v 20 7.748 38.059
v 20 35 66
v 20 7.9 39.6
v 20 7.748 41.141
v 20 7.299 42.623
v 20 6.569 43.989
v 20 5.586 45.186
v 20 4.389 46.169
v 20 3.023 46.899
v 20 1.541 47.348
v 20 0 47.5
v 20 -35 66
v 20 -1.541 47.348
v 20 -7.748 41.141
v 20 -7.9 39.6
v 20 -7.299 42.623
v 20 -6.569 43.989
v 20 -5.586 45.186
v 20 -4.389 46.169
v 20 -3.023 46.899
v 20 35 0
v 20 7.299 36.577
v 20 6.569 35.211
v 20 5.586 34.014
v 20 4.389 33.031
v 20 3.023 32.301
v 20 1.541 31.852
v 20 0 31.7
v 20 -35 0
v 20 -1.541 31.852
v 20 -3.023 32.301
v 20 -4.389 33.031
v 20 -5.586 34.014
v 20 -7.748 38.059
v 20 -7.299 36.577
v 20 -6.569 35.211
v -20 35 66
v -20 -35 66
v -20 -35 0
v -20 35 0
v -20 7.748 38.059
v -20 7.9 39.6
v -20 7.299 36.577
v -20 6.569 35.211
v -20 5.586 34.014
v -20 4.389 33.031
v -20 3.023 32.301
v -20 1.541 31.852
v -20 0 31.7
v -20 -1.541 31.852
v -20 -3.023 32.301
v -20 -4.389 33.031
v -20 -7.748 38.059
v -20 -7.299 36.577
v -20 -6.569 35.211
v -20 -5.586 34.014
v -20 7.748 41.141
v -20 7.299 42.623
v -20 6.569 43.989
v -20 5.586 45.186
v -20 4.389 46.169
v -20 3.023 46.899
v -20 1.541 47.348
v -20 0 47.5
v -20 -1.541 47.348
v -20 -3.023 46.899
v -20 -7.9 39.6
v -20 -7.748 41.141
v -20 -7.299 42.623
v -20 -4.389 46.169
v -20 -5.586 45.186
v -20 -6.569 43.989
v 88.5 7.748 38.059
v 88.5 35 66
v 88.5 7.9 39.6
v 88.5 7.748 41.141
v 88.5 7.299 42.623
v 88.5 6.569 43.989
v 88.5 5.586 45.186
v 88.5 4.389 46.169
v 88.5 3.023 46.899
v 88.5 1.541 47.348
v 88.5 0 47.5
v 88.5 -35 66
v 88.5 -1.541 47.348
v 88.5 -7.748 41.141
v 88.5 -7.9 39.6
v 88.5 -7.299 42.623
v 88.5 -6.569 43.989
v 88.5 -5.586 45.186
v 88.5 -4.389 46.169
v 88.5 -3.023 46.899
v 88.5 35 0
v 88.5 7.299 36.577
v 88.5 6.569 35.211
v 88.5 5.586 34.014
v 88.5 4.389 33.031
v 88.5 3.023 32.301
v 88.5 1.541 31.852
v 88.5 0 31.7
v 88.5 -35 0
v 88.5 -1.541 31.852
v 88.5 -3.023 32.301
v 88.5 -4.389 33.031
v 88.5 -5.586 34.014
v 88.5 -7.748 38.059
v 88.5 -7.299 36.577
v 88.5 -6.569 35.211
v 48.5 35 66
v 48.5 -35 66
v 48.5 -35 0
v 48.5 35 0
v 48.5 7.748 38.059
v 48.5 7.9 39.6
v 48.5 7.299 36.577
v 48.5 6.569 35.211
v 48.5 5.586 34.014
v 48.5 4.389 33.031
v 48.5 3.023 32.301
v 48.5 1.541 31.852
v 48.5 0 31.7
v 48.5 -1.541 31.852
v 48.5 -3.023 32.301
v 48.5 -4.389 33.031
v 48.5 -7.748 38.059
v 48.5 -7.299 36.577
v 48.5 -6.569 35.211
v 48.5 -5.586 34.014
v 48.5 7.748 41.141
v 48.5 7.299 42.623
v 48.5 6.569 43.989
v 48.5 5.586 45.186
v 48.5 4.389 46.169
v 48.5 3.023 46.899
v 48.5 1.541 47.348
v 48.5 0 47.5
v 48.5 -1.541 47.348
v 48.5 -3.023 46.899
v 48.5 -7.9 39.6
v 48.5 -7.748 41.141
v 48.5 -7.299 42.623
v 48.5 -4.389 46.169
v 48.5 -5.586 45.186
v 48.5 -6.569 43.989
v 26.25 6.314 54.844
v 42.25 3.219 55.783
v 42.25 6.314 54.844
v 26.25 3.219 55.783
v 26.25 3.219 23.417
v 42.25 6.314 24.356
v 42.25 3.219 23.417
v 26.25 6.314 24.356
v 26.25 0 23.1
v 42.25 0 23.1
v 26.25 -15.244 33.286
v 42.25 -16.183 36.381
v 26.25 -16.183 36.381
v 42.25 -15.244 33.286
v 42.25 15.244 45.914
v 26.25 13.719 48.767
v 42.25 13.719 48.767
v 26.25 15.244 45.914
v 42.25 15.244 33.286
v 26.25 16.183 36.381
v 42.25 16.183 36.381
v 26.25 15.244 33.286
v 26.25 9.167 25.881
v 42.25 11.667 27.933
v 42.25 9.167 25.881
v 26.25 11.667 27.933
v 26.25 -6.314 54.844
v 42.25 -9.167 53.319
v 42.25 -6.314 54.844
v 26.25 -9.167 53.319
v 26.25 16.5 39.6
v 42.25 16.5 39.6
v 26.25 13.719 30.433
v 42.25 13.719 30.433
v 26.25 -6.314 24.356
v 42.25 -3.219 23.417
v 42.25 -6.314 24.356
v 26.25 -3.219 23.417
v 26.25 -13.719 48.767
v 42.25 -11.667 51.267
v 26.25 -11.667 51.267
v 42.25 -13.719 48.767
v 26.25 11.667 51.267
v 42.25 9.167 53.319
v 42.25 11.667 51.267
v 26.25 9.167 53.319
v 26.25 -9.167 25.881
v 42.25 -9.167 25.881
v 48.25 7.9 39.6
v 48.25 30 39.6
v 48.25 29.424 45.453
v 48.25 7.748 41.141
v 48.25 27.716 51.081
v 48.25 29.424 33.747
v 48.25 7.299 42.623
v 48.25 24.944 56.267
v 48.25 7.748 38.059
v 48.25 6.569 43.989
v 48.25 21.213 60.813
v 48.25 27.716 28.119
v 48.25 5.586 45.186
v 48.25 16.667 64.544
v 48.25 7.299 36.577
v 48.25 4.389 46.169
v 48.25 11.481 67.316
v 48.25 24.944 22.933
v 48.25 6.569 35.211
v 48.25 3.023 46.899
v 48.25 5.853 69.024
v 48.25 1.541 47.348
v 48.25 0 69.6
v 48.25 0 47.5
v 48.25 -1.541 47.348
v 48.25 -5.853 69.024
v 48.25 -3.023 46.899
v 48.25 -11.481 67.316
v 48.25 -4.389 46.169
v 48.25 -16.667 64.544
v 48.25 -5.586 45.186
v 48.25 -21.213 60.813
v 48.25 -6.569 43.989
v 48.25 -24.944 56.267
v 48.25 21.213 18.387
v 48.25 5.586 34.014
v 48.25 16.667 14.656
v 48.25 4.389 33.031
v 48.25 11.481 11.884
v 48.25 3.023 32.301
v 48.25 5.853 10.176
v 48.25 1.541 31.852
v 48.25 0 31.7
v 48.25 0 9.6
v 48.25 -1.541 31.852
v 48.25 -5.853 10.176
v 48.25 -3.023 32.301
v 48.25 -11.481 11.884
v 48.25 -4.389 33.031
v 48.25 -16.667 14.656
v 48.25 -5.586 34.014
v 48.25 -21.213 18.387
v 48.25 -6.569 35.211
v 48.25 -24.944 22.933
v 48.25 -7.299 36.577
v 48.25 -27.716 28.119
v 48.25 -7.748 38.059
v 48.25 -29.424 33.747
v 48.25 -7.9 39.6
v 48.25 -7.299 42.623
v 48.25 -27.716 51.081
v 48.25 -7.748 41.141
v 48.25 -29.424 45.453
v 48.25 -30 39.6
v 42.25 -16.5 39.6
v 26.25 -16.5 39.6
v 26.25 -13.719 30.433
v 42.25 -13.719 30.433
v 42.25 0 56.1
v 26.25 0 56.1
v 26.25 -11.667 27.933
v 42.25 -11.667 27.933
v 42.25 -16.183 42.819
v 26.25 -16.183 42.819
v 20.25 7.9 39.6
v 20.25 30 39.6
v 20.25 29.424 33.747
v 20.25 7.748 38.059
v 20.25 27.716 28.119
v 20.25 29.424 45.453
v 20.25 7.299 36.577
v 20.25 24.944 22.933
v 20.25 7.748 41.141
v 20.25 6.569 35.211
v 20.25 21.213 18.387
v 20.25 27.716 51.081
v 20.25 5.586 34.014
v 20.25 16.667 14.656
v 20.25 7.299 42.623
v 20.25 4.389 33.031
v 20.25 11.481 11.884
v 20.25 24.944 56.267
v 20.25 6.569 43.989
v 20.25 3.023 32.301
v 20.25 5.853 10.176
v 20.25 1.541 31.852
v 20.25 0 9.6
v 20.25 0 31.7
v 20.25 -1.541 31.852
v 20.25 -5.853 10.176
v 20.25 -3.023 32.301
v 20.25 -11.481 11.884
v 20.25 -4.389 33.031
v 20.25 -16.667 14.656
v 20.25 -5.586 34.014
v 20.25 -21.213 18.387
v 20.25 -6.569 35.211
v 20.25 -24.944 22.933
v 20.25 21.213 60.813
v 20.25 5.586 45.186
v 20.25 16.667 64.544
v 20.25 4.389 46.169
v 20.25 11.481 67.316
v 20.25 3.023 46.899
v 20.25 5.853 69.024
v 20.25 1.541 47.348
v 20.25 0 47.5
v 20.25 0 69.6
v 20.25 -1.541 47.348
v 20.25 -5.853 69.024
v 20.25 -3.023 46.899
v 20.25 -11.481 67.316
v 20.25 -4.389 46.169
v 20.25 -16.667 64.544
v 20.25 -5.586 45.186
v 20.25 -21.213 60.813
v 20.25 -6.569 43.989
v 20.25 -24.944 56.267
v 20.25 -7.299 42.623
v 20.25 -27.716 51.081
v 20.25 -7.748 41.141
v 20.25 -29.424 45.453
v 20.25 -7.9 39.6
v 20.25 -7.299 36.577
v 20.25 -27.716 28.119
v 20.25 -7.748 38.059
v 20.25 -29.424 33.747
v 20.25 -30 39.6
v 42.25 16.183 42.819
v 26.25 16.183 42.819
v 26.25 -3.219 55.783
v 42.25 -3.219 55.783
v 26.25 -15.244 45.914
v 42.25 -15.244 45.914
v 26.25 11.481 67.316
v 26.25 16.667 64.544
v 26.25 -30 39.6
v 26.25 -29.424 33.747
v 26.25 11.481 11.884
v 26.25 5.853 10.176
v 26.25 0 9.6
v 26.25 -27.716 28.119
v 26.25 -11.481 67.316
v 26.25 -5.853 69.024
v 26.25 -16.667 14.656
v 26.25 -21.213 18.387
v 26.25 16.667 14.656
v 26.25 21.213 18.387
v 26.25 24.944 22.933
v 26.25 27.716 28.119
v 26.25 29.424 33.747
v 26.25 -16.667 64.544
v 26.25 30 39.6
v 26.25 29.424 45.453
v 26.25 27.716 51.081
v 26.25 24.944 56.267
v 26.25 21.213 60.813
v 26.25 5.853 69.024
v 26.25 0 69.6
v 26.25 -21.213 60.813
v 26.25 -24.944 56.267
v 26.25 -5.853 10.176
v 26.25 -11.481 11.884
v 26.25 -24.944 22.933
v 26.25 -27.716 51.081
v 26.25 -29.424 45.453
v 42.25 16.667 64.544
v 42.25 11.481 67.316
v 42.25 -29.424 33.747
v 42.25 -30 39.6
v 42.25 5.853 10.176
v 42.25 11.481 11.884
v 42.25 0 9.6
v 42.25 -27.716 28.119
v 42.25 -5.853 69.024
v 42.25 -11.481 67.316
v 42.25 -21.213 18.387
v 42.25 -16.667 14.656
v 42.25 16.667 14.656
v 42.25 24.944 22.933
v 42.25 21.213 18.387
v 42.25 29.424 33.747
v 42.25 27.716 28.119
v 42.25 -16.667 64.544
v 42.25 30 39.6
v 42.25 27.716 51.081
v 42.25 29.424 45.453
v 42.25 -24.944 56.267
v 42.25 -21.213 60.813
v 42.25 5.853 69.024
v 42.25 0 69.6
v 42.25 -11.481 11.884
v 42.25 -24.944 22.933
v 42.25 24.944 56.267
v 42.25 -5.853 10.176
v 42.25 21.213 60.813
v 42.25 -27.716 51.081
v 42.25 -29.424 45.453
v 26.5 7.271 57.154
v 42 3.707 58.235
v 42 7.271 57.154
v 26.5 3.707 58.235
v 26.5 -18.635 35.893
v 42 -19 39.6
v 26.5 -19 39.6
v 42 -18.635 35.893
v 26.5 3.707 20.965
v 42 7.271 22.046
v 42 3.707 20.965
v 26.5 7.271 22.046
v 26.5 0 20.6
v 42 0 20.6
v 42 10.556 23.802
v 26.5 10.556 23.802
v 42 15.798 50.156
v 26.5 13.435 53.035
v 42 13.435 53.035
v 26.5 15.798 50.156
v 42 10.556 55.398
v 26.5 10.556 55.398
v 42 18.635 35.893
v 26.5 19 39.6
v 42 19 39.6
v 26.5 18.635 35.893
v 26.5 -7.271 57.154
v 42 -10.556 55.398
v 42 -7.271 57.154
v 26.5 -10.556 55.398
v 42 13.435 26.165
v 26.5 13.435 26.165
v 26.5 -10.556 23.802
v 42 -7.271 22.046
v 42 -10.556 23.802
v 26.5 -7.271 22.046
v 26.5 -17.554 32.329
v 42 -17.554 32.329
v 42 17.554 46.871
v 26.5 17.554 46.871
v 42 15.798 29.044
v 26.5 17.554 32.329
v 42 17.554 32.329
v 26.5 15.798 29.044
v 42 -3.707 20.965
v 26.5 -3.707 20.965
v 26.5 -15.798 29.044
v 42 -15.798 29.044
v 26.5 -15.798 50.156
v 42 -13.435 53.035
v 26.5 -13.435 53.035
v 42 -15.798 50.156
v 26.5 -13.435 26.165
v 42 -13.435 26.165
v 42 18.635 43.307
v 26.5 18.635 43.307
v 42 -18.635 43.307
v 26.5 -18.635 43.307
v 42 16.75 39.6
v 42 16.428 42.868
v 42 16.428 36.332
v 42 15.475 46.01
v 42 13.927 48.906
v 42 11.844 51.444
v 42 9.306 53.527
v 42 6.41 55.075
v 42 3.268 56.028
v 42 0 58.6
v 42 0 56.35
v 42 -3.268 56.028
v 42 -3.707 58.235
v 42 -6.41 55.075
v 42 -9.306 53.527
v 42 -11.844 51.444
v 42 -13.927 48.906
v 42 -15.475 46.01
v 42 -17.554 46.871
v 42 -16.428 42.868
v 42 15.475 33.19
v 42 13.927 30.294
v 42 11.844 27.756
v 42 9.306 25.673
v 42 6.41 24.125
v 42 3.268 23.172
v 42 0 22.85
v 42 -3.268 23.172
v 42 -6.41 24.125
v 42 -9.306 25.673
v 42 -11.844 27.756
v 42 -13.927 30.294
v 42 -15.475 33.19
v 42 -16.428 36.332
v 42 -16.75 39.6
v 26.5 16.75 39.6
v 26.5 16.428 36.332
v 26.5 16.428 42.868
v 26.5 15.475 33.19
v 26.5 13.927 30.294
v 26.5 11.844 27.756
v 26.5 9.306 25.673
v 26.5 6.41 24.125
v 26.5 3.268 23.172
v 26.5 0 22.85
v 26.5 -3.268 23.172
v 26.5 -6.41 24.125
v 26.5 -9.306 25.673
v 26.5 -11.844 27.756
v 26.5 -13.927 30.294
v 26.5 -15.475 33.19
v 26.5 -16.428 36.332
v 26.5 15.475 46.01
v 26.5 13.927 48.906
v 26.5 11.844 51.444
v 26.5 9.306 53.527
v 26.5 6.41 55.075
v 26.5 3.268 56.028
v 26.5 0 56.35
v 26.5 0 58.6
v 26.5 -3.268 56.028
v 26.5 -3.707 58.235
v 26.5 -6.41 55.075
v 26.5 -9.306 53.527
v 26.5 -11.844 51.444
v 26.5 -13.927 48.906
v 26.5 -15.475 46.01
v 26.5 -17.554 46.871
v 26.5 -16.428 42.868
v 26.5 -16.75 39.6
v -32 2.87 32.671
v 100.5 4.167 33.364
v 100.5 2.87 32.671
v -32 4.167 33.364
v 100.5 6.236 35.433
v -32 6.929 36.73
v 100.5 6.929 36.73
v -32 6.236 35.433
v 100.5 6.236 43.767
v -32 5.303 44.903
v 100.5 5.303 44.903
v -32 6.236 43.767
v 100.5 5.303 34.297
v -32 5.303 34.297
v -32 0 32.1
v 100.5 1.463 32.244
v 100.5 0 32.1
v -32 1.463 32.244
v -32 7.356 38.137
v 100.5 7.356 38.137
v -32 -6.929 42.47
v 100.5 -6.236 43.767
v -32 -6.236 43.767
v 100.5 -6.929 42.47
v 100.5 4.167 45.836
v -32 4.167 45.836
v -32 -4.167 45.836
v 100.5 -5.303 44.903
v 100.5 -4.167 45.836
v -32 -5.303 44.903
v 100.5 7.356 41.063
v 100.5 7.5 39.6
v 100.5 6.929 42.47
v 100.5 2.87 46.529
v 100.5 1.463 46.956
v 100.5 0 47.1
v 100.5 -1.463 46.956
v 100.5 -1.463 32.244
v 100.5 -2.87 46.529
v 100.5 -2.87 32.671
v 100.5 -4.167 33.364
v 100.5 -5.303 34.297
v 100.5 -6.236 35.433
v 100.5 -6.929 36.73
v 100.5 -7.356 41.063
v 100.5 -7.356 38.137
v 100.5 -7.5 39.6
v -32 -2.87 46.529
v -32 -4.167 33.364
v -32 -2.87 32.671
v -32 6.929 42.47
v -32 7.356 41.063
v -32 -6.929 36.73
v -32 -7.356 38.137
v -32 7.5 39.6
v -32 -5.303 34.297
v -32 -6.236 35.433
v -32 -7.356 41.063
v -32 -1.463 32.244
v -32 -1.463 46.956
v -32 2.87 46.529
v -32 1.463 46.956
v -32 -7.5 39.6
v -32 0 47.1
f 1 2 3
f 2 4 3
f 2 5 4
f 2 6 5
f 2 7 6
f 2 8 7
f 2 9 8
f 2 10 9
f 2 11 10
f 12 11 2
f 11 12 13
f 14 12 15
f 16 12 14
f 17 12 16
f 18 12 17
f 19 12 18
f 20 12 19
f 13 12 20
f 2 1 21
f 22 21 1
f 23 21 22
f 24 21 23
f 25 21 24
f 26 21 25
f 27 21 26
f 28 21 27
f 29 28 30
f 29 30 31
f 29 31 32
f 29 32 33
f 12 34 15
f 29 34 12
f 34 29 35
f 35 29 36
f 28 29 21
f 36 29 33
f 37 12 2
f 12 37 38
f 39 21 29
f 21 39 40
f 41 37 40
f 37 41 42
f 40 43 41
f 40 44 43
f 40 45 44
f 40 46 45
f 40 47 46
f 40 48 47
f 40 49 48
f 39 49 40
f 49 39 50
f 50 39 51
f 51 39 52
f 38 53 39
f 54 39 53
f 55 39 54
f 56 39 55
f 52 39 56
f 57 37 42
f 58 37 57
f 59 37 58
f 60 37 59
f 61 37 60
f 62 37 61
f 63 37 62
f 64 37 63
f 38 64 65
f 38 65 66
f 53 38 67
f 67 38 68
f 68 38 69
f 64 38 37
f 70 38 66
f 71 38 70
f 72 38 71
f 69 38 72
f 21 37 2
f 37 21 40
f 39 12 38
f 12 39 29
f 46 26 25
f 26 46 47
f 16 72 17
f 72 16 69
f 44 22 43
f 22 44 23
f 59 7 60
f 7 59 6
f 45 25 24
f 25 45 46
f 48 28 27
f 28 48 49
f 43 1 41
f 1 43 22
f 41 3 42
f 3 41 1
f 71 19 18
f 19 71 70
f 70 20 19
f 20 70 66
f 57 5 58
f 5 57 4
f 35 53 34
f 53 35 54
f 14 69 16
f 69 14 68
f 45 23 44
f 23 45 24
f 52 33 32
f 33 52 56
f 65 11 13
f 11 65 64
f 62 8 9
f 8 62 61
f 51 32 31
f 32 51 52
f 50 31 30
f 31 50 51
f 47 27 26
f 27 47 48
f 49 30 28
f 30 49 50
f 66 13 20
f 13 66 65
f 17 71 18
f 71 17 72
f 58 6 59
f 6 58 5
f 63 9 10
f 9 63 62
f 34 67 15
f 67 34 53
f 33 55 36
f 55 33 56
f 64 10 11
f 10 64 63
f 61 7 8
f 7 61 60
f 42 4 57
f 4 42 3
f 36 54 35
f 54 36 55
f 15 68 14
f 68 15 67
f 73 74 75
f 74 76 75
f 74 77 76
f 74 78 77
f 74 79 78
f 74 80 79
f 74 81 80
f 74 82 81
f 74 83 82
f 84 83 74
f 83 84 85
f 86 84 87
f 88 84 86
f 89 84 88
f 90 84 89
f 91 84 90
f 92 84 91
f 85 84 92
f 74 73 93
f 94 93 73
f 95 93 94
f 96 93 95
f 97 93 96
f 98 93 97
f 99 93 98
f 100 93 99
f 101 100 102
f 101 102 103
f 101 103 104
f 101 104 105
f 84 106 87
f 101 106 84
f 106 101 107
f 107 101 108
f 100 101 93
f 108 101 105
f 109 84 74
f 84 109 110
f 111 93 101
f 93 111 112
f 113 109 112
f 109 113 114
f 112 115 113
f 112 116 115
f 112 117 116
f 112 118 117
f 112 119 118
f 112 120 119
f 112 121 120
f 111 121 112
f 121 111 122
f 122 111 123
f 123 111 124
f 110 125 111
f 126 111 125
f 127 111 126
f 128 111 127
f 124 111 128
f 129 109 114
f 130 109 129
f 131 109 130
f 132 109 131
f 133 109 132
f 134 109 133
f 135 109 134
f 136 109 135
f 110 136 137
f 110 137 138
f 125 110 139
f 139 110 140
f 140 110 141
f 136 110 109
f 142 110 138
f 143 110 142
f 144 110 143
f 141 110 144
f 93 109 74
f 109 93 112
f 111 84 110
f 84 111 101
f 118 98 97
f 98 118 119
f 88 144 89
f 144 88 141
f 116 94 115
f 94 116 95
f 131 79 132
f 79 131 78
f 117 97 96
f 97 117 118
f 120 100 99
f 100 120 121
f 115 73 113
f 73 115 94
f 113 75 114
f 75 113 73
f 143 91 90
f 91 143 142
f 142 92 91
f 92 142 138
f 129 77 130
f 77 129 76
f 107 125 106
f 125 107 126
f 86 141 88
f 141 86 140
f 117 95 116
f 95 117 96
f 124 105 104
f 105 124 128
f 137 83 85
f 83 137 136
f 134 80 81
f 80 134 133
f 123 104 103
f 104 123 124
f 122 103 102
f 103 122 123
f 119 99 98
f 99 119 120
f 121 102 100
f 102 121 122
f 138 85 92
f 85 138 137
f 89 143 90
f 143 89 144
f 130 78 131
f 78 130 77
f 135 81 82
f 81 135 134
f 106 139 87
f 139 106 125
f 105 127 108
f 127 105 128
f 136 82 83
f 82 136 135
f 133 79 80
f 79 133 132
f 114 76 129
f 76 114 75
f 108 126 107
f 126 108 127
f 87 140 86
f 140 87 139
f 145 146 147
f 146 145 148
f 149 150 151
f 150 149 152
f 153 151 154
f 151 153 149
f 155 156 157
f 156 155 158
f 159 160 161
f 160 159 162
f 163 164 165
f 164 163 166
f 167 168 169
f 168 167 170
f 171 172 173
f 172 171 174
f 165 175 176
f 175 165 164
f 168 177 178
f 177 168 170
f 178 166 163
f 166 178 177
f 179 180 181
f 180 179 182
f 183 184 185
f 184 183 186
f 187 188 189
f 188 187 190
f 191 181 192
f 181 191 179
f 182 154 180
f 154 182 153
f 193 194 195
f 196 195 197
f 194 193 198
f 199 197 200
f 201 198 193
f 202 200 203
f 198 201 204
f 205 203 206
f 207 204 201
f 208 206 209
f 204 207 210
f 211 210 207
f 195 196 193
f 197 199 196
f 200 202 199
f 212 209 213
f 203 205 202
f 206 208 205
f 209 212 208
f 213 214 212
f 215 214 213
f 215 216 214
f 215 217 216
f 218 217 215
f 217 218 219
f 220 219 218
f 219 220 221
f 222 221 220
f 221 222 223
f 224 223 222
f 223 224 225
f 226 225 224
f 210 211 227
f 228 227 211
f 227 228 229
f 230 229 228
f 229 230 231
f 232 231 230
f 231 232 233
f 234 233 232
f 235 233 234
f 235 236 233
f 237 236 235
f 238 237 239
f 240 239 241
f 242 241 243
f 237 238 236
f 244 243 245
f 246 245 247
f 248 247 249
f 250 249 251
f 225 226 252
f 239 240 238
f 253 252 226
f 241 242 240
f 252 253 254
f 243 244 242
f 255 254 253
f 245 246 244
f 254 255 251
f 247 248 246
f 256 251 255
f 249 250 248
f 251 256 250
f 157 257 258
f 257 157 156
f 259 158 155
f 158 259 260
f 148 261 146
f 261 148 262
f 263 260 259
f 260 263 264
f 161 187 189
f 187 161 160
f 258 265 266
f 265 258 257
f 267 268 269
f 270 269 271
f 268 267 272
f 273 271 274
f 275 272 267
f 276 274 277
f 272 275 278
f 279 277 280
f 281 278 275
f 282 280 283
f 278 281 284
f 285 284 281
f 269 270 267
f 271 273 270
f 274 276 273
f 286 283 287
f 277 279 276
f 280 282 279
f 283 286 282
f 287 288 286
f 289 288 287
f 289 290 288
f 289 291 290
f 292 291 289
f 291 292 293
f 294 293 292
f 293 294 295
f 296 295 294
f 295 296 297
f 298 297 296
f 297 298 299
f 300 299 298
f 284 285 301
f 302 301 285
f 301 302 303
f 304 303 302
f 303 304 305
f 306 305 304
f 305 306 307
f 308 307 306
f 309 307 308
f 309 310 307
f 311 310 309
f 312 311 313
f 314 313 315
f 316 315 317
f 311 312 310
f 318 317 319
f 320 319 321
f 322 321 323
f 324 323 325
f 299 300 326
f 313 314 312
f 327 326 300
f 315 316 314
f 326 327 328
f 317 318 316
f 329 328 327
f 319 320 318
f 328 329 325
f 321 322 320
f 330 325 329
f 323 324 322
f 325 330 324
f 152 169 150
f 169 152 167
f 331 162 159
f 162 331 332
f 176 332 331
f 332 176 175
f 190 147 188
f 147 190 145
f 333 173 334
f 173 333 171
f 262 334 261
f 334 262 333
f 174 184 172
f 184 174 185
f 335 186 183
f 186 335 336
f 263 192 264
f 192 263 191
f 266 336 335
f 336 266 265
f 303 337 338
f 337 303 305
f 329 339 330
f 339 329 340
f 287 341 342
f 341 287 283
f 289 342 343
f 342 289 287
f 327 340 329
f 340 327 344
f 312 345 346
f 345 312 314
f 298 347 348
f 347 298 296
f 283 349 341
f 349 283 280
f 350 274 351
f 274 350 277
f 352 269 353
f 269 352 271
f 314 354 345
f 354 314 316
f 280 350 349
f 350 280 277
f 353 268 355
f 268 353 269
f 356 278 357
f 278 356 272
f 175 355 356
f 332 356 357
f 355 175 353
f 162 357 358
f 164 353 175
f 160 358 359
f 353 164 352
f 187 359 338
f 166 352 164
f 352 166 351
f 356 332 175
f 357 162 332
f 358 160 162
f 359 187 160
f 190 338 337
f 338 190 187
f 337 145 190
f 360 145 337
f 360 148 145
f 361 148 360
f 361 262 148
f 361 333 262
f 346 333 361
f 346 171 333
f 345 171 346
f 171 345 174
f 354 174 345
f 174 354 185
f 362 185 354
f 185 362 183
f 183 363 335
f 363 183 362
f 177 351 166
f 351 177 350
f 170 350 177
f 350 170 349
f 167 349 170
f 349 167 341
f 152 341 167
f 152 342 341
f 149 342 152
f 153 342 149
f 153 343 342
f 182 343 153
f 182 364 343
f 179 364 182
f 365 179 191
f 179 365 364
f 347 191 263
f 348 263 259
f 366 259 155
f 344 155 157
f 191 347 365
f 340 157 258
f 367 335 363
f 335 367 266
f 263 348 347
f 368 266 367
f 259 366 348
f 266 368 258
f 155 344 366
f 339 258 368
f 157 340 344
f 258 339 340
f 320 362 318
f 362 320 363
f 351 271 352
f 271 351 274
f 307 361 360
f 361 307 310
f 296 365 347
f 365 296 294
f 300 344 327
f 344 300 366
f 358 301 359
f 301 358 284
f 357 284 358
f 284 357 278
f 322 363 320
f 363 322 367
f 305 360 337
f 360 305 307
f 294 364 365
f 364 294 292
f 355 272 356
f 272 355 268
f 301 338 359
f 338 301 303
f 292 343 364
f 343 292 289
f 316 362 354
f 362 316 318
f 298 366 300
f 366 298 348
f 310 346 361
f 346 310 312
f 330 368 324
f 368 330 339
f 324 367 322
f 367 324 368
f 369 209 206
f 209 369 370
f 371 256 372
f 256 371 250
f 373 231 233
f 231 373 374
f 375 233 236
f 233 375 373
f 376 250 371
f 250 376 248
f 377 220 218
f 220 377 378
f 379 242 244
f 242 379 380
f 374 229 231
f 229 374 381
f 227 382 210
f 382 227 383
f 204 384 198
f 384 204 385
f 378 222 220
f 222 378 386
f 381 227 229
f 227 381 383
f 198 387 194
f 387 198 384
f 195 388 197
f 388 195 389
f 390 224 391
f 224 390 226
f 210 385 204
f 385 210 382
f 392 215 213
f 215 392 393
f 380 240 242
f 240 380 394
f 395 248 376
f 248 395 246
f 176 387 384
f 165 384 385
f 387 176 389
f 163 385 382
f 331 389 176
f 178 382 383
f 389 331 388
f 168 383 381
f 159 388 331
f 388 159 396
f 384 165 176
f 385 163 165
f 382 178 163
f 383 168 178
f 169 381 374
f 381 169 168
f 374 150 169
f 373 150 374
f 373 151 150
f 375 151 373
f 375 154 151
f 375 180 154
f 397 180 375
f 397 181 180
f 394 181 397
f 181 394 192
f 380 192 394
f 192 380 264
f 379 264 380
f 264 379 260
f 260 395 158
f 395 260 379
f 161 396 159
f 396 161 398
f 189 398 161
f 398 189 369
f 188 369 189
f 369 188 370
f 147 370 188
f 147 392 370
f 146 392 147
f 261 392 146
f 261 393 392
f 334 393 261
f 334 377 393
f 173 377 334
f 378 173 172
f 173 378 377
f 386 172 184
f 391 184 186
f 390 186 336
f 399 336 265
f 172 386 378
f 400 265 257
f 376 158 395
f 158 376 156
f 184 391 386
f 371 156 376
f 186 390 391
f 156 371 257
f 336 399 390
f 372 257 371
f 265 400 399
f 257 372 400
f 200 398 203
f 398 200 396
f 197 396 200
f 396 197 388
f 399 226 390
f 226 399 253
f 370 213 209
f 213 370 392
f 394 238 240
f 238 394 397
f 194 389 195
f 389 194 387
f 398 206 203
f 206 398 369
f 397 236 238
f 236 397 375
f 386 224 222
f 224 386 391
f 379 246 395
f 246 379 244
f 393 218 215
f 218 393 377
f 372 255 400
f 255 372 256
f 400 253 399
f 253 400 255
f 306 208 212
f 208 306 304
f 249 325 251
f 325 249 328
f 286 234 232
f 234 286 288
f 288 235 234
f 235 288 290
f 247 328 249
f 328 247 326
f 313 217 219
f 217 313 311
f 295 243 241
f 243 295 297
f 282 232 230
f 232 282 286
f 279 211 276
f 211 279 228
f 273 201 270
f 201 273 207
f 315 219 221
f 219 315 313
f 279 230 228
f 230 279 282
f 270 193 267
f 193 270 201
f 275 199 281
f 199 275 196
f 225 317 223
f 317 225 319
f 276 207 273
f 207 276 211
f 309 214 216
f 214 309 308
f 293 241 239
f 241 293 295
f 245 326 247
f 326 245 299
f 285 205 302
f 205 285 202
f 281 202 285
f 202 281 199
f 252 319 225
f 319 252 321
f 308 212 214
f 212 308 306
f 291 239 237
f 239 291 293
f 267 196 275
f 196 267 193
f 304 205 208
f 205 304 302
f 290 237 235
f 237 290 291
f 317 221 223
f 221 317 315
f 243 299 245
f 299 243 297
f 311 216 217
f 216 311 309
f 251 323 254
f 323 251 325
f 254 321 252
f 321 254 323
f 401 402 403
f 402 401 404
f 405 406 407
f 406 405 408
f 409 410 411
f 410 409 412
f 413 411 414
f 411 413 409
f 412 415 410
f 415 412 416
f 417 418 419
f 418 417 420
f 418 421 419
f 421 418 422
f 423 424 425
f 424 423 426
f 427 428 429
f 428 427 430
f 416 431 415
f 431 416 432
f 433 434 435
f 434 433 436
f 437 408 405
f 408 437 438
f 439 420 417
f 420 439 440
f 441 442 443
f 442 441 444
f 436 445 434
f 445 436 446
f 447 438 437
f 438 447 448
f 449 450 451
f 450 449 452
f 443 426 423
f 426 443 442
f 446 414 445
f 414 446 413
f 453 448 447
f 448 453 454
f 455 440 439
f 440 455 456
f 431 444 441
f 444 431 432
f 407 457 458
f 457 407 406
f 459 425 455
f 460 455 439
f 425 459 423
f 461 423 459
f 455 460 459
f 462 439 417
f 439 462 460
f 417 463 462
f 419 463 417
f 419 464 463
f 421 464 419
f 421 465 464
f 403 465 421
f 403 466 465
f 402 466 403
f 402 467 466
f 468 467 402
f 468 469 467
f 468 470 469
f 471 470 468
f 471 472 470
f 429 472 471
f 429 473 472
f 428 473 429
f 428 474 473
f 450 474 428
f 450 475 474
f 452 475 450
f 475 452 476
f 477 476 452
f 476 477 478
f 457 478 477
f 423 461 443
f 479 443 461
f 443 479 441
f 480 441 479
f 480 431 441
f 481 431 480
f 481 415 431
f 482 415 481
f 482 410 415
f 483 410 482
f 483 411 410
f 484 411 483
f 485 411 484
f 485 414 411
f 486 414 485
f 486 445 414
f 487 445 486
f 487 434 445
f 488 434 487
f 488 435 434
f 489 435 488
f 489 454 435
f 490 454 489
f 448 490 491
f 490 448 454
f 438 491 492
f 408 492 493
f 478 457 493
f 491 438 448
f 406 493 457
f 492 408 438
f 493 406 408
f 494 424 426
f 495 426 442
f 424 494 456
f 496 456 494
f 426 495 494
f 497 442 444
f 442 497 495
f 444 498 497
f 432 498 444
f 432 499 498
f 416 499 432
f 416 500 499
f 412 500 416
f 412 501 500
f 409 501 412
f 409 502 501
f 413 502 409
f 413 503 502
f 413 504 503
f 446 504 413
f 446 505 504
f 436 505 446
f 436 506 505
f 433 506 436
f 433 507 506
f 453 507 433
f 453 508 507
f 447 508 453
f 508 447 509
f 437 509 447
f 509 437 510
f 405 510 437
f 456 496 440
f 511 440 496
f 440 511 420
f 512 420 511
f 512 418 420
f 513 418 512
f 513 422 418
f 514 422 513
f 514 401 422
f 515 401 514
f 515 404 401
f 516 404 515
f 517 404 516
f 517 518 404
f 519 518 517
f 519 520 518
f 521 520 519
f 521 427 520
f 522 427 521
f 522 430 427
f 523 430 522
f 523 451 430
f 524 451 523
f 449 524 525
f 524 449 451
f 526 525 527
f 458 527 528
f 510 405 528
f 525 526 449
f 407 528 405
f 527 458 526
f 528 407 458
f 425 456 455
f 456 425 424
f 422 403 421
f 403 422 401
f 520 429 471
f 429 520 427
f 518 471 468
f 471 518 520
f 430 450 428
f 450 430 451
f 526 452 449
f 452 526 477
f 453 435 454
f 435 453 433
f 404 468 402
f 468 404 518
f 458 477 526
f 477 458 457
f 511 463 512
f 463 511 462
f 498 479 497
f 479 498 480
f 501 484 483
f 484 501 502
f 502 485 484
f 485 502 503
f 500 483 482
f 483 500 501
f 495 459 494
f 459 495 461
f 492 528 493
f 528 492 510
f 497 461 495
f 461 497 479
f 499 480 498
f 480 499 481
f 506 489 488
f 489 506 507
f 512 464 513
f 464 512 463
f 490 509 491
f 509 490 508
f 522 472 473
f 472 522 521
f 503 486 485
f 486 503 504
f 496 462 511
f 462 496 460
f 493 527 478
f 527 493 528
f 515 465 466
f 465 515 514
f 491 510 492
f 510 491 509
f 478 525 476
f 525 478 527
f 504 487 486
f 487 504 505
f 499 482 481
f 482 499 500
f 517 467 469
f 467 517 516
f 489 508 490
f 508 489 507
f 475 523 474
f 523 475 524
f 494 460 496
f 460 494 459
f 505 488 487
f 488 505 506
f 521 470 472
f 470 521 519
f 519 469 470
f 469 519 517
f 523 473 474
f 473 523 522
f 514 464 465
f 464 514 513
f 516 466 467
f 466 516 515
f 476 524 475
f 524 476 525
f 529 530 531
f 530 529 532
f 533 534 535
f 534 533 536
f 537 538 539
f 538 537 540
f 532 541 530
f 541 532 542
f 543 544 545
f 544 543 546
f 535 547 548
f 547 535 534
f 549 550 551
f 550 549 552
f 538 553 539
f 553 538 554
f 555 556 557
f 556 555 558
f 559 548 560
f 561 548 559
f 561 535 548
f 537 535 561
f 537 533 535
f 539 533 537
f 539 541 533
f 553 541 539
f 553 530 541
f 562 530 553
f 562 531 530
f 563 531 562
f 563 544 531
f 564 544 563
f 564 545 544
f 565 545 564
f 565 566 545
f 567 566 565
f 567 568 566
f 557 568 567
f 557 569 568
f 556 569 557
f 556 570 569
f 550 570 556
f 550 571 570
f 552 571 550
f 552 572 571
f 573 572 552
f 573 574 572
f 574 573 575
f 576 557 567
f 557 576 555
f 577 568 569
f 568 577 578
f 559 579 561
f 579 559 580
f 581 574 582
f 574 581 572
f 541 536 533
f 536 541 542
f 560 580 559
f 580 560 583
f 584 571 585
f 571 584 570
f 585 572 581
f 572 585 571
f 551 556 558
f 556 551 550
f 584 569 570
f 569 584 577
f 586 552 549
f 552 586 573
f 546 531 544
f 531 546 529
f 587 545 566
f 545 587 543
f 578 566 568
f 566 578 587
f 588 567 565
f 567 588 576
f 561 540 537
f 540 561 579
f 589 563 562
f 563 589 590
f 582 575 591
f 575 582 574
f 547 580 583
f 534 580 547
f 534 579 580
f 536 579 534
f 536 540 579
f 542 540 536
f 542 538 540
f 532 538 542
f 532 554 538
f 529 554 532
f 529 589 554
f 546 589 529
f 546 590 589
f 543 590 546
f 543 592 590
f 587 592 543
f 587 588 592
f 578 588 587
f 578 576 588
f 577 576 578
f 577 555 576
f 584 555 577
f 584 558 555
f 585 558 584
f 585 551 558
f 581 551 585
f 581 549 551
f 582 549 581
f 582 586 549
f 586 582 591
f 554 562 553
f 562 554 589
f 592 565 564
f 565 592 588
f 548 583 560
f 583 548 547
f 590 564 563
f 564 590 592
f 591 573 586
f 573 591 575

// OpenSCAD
$fn = 32;

// ------------------------------------------------------------------------
// Pulley assembly: d60 pulley with a belt, shaft d15
// Every part is its own module, assembly() places them once.
// ------------------------------------------------------------------------

// --- part 1 ---
module support1() {
  difference() {
    translate([-20, -35, 0]) cube([40, 70, 66]);
    translate([0, 0, 39.6]) rotate([0, 90, 0]) cylinder(h = 42, d = 15.8, center = true);
  }
}

// --- part 2 ---
module support2() {
  difference() {
    translate([-20, -35, 0]) cube([40, 70, 66]);
    translate([0, 0, 39.6]) rotate([0, 90, 0]) cylinder(h = 42, d = 15.8, center = true);
  }
}

// --- part 3 ---
module shaft() {
  translate([0, 0, -66.25]) cylinder(h = 132.5, d = 15);
}

// --- part 4 ---
module pulley() {
  difference() {
    union() {
      cylinder(h = 28, d = 33);
      cylinder(h = 6, d = 60);
      translate([0, 0, 22]) cylinder(h = 6, d = 60);
    }
    translate([0, 0, -1]) cylinder(h = 30, d = 15.8);
  }
}

// --- part 5 ---
module belt() {
  difference() {
      translate([0, 0, 0]) cylinder(h = 15.5, d = 38);
      translate([0, 0, -1]) cylinder(h = 17.5, d = 33.5);
    }
}

// --- assembly ---
module assembly() {
  translate([0, 0, 0]) rotate([0, 0, 0]) support1();
  translate([68.5, 0, 0]) rotate([0, 0, 0]) support2();
  translate([34.25, 0, 39.6]) rotate([0, 90, 0]) shaft();
  translate([20.25, 0, 39.6]) rotate([0, 90, 0]) pulley();
  translate([26.5, 0, 39.6]) rotate([0, 90, 0]) belt();
}

assembly();
